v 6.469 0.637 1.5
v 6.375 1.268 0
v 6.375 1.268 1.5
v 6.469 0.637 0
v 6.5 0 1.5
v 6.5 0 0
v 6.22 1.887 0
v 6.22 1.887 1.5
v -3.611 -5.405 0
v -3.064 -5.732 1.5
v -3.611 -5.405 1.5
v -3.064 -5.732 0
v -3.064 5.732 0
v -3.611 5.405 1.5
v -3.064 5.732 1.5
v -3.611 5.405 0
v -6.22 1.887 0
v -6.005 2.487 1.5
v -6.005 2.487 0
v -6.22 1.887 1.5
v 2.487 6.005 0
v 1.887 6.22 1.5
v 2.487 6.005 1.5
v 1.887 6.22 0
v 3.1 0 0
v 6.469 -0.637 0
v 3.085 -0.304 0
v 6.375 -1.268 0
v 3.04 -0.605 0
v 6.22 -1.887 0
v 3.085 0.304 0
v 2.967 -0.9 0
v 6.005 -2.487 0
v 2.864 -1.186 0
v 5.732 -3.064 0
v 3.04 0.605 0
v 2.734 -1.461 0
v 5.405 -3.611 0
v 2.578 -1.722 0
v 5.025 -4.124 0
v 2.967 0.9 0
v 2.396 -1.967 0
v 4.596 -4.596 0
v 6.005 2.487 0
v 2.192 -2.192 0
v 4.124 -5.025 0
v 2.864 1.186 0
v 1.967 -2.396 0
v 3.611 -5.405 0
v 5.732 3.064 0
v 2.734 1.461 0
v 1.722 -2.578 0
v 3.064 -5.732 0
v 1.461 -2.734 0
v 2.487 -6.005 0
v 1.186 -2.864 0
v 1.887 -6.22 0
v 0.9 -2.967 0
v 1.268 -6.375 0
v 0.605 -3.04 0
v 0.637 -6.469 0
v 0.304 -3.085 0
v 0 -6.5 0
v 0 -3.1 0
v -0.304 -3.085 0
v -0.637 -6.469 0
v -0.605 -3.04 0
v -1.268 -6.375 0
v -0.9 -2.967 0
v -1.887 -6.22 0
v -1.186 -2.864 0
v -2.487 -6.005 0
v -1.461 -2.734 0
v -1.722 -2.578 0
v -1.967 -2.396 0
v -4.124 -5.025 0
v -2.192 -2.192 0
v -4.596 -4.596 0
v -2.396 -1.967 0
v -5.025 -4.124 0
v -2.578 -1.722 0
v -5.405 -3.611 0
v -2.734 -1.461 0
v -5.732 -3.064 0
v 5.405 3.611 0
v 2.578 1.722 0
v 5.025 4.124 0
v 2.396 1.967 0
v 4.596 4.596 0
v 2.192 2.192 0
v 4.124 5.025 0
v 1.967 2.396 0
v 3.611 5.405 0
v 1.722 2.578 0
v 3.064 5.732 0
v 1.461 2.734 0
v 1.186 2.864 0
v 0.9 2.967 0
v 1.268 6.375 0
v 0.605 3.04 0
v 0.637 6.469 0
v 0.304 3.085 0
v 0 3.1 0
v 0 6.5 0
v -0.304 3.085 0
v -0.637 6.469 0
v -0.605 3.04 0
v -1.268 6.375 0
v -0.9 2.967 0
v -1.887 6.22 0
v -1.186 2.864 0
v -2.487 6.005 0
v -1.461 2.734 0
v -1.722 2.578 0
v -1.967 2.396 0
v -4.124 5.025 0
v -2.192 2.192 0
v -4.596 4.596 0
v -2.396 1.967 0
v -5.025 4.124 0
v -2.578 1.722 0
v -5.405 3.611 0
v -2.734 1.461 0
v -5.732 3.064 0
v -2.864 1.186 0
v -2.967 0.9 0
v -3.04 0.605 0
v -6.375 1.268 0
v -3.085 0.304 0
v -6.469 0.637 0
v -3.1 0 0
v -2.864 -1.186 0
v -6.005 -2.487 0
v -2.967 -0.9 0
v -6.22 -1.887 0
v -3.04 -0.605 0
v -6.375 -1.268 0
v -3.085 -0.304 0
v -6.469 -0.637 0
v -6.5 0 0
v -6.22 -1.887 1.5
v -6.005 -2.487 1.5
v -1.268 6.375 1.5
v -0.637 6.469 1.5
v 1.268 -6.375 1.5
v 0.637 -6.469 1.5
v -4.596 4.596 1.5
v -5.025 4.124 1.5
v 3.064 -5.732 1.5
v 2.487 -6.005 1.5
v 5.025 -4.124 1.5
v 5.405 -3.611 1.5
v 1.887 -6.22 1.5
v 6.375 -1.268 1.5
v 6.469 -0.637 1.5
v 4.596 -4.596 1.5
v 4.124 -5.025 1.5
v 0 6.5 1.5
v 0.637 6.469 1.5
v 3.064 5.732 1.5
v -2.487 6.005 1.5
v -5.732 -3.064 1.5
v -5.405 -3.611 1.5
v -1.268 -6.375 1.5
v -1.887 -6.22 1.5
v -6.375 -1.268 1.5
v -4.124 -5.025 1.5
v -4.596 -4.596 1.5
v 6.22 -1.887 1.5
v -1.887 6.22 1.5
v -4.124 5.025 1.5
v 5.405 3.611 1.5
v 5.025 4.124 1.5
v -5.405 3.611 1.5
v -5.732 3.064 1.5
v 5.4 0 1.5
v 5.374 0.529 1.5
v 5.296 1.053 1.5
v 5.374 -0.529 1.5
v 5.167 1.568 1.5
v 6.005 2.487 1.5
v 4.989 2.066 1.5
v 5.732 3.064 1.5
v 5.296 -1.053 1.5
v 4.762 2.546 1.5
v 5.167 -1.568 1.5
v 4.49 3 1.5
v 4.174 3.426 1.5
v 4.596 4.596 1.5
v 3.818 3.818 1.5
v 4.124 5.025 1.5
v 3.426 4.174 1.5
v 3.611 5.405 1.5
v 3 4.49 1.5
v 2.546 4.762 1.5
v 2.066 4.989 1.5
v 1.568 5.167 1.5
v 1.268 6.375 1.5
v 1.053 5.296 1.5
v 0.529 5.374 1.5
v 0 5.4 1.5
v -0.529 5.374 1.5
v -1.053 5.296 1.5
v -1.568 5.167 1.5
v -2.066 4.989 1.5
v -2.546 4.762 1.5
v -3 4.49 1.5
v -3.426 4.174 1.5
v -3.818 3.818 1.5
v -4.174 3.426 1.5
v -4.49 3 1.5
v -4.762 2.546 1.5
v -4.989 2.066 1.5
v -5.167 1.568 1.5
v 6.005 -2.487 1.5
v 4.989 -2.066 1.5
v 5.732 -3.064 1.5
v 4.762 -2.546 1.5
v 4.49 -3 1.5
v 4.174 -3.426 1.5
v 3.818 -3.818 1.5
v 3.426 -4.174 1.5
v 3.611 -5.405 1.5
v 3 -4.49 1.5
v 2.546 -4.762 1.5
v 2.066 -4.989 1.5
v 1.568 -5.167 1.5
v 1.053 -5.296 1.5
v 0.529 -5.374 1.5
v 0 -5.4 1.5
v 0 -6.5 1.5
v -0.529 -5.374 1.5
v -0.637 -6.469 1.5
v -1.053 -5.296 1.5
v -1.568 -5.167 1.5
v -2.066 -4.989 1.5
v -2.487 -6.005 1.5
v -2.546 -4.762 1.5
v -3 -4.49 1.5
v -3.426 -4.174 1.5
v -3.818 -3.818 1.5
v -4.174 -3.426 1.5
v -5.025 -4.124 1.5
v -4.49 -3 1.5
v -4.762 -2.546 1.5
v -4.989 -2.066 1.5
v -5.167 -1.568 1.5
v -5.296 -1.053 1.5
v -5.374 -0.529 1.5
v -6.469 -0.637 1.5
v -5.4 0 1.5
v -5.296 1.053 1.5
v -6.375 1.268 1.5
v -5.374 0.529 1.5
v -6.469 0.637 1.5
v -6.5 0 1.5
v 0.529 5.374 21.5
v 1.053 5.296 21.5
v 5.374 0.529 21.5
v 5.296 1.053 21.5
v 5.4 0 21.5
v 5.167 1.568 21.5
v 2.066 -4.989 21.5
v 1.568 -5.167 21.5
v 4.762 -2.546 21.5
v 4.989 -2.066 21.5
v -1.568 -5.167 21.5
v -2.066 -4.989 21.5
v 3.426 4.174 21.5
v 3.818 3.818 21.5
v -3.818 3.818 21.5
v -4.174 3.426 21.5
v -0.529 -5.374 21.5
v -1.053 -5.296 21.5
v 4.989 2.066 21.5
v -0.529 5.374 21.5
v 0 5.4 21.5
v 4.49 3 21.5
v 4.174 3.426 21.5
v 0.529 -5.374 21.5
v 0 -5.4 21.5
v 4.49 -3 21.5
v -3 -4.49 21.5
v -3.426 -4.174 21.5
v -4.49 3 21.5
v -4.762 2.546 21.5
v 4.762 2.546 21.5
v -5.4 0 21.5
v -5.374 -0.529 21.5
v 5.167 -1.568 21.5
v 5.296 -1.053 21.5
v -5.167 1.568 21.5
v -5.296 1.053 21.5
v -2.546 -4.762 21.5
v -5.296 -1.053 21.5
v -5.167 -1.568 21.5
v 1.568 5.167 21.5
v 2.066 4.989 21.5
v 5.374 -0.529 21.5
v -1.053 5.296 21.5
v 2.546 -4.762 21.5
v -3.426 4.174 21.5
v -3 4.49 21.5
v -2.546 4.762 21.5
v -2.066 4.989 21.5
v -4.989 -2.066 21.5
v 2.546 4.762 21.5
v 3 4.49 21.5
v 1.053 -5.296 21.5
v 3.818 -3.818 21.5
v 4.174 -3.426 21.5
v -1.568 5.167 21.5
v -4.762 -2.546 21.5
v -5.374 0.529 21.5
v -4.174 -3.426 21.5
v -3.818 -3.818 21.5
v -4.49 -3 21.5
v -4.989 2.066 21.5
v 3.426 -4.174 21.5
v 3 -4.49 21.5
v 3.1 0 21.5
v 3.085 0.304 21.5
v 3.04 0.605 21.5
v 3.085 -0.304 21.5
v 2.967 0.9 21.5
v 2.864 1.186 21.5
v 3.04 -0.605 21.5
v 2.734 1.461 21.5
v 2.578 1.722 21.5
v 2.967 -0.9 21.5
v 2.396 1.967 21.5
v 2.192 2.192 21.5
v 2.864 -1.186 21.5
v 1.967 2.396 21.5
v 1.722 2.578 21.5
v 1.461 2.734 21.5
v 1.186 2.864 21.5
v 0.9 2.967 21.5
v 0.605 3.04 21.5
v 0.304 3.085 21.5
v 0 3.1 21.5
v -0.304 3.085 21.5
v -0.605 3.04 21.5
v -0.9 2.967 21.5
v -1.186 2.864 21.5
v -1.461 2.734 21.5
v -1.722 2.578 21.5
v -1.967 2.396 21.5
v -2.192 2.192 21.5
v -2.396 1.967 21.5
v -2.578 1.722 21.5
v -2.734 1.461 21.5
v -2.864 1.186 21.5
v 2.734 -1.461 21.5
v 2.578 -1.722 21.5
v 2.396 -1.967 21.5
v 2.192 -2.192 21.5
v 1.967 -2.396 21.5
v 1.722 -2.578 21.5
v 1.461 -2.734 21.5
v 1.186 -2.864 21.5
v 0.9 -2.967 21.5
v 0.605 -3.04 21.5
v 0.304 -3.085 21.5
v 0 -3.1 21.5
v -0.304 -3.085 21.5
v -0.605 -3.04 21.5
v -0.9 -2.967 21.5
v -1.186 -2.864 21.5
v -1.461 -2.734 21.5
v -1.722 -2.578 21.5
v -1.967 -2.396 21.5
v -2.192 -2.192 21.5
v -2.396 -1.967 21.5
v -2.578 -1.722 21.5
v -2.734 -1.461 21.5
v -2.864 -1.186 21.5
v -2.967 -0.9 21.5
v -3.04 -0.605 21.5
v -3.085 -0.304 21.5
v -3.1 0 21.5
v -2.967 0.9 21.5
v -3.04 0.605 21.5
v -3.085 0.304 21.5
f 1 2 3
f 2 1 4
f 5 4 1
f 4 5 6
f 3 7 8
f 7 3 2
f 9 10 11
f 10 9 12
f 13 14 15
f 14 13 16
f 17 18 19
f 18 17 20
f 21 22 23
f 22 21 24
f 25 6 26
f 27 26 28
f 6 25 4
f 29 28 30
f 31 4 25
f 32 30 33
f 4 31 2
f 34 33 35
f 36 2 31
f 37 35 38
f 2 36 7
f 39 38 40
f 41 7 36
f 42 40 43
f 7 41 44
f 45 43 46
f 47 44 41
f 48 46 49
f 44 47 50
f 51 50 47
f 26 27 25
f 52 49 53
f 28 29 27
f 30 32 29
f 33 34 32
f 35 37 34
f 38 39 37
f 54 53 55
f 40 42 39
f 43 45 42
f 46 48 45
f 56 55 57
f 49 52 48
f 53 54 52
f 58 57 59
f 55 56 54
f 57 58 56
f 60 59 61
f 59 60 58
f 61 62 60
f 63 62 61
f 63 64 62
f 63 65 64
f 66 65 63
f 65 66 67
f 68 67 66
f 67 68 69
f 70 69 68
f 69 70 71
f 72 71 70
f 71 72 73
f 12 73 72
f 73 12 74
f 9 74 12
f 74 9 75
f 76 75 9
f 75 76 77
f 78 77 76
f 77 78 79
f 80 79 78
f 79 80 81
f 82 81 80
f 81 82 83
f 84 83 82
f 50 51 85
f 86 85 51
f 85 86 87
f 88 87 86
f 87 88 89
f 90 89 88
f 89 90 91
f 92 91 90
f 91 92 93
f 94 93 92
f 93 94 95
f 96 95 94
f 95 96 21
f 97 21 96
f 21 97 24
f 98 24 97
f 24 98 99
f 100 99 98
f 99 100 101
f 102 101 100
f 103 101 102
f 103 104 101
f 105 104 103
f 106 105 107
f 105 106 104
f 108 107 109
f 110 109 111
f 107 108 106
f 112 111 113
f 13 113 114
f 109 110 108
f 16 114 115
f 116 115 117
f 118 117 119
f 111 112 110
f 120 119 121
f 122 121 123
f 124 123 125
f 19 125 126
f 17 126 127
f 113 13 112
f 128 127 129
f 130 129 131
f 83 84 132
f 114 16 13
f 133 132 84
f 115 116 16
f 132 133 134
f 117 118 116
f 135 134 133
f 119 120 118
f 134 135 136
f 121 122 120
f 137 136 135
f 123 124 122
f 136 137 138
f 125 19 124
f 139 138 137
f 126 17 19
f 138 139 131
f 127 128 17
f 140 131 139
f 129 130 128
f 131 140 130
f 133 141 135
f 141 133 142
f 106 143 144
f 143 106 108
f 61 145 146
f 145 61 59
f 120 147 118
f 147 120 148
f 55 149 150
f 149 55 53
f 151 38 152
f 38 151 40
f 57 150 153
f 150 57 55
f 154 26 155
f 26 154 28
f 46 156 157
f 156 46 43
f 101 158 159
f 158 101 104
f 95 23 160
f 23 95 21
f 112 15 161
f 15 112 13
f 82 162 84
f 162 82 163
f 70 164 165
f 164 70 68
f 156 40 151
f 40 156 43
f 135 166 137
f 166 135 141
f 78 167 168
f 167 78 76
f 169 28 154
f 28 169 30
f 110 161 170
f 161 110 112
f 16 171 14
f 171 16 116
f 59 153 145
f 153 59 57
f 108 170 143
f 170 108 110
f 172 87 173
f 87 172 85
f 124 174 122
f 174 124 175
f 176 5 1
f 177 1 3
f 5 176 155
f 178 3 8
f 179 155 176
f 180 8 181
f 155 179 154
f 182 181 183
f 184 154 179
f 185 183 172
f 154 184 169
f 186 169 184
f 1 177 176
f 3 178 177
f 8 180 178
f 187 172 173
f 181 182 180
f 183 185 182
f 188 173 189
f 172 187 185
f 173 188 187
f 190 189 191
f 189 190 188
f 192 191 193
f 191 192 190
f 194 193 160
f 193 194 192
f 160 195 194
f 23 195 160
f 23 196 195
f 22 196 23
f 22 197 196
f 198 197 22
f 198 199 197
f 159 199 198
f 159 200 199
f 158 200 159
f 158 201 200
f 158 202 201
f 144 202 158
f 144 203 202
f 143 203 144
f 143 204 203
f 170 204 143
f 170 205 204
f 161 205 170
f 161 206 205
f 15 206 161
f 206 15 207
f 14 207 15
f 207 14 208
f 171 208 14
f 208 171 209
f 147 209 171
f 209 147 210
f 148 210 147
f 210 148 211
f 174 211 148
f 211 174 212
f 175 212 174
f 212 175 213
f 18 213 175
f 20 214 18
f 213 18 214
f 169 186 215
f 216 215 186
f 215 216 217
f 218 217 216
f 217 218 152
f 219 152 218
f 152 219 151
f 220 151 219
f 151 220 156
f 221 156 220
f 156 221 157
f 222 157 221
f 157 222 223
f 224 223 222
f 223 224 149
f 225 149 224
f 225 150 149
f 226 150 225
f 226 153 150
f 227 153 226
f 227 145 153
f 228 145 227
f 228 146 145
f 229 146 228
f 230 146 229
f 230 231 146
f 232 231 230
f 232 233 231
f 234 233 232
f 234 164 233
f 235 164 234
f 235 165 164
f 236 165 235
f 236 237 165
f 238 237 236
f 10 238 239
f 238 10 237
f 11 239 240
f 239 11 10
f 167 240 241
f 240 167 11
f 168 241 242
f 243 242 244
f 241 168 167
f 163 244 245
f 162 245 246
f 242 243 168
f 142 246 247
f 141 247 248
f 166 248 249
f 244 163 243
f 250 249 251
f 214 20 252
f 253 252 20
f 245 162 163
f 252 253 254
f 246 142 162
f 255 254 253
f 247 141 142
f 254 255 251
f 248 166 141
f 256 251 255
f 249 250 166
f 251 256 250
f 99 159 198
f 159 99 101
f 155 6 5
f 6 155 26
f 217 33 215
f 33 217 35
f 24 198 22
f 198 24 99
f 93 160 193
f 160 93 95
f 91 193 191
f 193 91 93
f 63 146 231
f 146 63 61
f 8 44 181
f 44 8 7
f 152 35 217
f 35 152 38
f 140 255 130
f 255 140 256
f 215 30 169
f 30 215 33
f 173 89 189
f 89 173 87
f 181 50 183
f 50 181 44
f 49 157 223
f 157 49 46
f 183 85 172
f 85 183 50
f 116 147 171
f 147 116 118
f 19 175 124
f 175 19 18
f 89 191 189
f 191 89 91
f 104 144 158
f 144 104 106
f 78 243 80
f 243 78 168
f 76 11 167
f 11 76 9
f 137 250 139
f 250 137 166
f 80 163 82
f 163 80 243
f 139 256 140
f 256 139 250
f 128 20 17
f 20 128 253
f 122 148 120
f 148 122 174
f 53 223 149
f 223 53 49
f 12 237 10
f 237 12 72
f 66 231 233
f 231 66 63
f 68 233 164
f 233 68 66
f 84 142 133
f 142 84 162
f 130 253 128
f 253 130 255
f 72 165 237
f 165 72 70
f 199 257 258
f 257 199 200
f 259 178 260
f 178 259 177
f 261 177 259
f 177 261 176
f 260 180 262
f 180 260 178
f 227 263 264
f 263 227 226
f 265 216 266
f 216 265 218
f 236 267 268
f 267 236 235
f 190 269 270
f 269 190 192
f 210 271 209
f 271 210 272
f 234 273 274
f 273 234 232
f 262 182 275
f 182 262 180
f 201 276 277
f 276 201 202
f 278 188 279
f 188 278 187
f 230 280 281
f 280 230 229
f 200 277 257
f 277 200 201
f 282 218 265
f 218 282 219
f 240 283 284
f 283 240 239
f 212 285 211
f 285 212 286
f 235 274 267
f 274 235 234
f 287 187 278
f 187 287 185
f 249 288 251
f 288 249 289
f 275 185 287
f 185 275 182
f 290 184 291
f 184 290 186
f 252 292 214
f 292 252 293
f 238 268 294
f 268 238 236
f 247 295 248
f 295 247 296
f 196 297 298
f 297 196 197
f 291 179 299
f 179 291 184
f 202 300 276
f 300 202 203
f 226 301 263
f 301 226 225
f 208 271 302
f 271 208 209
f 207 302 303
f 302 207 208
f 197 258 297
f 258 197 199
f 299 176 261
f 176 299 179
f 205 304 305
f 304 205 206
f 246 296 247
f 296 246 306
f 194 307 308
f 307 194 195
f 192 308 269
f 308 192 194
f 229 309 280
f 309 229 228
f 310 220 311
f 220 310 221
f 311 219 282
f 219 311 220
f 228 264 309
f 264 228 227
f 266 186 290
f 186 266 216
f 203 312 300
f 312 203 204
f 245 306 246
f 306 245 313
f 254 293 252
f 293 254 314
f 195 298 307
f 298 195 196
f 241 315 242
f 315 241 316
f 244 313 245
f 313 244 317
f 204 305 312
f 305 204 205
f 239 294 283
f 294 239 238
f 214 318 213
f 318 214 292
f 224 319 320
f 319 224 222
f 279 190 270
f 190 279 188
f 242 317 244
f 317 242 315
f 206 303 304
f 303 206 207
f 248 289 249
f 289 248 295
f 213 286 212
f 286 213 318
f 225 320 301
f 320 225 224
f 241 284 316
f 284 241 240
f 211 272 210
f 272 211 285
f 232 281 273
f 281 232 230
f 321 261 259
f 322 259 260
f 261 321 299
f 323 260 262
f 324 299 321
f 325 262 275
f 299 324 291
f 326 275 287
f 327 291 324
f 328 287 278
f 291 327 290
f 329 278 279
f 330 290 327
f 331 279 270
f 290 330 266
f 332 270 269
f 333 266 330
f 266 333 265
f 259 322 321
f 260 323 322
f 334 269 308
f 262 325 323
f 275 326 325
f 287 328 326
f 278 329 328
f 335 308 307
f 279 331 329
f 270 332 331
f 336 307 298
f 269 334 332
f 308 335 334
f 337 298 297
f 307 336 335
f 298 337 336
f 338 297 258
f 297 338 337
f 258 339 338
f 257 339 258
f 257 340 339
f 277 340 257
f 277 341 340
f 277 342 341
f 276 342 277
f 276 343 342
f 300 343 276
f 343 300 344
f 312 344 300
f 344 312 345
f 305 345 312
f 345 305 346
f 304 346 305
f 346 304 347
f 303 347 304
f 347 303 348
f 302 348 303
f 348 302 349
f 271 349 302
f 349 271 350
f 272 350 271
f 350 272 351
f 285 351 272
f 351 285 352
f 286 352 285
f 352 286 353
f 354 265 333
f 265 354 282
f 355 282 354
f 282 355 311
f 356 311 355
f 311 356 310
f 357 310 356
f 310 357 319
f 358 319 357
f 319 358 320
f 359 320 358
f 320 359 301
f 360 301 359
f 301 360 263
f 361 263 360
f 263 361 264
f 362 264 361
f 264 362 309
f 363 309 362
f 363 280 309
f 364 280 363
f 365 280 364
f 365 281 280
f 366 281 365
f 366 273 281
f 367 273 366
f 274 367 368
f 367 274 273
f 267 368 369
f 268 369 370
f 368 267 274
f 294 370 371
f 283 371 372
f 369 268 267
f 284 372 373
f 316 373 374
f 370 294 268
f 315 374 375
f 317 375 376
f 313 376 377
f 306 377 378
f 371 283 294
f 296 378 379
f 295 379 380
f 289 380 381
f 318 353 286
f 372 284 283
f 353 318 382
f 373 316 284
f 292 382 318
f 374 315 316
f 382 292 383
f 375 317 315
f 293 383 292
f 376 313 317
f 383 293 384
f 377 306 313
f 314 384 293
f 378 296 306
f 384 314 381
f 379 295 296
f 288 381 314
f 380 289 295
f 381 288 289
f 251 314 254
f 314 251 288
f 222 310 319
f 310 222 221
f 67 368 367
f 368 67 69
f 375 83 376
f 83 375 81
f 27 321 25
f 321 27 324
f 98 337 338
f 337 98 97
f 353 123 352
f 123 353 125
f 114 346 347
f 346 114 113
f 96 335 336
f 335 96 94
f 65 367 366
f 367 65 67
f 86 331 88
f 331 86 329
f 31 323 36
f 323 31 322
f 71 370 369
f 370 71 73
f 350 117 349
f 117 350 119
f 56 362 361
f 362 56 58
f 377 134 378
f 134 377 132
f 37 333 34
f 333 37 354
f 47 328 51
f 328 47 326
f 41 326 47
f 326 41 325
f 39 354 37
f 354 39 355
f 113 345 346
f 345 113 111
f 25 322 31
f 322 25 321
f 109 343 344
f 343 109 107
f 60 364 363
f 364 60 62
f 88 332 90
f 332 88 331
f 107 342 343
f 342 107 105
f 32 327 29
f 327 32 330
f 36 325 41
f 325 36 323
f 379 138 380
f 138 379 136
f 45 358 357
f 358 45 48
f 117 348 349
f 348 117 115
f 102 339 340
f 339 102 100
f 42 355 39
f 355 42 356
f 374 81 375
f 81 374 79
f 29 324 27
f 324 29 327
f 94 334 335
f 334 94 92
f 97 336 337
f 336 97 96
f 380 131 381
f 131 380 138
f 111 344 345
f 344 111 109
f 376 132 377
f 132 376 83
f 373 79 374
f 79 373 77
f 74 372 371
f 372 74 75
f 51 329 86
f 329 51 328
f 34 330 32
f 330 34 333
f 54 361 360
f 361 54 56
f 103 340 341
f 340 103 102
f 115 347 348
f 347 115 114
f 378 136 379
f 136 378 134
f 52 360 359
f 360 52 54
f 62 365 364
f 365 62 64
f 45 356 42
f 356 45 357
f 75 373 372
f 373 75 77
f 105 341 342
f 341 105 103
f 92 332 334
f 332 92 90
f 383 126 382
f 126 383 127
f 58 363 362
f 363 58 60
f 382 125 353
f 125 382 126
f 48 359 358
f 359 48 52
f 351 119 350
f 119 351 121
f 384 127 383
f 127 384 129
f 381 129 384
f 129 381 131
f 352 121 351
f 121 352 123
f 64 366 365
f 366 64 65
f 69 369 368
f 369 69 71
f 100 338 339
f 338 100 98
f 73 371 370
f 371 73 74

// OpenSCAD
// PCR tube adapter sleeve
// Allows a 0.2 mL PCR tube to sit in a 1.5 mL tube rack hole

// Dimensions (all in mm)
collar_od = 13;         // Collar outer diameter (sits in 1.5mL hole)
collar_h = 1.5;         // Collar height on bed
sleeve_od = 10.8;       // Sleeve body outer diameter
sleeve_h = 20;          // Sleeve body height (21.5 - 1.5)
bore_d = 6.2;           // Central bore diameter (for 0.2mL tube)
total_height = 21.5;    // Total height from bed

$fn = 64;               // Resolution for smooth circles

// Create the adapter
difference() {
    union() {
        // Collar - wide base that rests on rack
        cylinder(h = collar_h, d = collar_od, center = false);
        
        // Sleeve - main body for holding tube
        translate([0, 0, collar_h])
        cylinder(h = sleeve_h, d = sleeve_od, center = false);
    }
    
    // Central bore - extends past both ends for clean cuts
    translate([0, 0, -0.5])
    cylinder(h = total_height + 1, d = bore_d, center = false);
}
